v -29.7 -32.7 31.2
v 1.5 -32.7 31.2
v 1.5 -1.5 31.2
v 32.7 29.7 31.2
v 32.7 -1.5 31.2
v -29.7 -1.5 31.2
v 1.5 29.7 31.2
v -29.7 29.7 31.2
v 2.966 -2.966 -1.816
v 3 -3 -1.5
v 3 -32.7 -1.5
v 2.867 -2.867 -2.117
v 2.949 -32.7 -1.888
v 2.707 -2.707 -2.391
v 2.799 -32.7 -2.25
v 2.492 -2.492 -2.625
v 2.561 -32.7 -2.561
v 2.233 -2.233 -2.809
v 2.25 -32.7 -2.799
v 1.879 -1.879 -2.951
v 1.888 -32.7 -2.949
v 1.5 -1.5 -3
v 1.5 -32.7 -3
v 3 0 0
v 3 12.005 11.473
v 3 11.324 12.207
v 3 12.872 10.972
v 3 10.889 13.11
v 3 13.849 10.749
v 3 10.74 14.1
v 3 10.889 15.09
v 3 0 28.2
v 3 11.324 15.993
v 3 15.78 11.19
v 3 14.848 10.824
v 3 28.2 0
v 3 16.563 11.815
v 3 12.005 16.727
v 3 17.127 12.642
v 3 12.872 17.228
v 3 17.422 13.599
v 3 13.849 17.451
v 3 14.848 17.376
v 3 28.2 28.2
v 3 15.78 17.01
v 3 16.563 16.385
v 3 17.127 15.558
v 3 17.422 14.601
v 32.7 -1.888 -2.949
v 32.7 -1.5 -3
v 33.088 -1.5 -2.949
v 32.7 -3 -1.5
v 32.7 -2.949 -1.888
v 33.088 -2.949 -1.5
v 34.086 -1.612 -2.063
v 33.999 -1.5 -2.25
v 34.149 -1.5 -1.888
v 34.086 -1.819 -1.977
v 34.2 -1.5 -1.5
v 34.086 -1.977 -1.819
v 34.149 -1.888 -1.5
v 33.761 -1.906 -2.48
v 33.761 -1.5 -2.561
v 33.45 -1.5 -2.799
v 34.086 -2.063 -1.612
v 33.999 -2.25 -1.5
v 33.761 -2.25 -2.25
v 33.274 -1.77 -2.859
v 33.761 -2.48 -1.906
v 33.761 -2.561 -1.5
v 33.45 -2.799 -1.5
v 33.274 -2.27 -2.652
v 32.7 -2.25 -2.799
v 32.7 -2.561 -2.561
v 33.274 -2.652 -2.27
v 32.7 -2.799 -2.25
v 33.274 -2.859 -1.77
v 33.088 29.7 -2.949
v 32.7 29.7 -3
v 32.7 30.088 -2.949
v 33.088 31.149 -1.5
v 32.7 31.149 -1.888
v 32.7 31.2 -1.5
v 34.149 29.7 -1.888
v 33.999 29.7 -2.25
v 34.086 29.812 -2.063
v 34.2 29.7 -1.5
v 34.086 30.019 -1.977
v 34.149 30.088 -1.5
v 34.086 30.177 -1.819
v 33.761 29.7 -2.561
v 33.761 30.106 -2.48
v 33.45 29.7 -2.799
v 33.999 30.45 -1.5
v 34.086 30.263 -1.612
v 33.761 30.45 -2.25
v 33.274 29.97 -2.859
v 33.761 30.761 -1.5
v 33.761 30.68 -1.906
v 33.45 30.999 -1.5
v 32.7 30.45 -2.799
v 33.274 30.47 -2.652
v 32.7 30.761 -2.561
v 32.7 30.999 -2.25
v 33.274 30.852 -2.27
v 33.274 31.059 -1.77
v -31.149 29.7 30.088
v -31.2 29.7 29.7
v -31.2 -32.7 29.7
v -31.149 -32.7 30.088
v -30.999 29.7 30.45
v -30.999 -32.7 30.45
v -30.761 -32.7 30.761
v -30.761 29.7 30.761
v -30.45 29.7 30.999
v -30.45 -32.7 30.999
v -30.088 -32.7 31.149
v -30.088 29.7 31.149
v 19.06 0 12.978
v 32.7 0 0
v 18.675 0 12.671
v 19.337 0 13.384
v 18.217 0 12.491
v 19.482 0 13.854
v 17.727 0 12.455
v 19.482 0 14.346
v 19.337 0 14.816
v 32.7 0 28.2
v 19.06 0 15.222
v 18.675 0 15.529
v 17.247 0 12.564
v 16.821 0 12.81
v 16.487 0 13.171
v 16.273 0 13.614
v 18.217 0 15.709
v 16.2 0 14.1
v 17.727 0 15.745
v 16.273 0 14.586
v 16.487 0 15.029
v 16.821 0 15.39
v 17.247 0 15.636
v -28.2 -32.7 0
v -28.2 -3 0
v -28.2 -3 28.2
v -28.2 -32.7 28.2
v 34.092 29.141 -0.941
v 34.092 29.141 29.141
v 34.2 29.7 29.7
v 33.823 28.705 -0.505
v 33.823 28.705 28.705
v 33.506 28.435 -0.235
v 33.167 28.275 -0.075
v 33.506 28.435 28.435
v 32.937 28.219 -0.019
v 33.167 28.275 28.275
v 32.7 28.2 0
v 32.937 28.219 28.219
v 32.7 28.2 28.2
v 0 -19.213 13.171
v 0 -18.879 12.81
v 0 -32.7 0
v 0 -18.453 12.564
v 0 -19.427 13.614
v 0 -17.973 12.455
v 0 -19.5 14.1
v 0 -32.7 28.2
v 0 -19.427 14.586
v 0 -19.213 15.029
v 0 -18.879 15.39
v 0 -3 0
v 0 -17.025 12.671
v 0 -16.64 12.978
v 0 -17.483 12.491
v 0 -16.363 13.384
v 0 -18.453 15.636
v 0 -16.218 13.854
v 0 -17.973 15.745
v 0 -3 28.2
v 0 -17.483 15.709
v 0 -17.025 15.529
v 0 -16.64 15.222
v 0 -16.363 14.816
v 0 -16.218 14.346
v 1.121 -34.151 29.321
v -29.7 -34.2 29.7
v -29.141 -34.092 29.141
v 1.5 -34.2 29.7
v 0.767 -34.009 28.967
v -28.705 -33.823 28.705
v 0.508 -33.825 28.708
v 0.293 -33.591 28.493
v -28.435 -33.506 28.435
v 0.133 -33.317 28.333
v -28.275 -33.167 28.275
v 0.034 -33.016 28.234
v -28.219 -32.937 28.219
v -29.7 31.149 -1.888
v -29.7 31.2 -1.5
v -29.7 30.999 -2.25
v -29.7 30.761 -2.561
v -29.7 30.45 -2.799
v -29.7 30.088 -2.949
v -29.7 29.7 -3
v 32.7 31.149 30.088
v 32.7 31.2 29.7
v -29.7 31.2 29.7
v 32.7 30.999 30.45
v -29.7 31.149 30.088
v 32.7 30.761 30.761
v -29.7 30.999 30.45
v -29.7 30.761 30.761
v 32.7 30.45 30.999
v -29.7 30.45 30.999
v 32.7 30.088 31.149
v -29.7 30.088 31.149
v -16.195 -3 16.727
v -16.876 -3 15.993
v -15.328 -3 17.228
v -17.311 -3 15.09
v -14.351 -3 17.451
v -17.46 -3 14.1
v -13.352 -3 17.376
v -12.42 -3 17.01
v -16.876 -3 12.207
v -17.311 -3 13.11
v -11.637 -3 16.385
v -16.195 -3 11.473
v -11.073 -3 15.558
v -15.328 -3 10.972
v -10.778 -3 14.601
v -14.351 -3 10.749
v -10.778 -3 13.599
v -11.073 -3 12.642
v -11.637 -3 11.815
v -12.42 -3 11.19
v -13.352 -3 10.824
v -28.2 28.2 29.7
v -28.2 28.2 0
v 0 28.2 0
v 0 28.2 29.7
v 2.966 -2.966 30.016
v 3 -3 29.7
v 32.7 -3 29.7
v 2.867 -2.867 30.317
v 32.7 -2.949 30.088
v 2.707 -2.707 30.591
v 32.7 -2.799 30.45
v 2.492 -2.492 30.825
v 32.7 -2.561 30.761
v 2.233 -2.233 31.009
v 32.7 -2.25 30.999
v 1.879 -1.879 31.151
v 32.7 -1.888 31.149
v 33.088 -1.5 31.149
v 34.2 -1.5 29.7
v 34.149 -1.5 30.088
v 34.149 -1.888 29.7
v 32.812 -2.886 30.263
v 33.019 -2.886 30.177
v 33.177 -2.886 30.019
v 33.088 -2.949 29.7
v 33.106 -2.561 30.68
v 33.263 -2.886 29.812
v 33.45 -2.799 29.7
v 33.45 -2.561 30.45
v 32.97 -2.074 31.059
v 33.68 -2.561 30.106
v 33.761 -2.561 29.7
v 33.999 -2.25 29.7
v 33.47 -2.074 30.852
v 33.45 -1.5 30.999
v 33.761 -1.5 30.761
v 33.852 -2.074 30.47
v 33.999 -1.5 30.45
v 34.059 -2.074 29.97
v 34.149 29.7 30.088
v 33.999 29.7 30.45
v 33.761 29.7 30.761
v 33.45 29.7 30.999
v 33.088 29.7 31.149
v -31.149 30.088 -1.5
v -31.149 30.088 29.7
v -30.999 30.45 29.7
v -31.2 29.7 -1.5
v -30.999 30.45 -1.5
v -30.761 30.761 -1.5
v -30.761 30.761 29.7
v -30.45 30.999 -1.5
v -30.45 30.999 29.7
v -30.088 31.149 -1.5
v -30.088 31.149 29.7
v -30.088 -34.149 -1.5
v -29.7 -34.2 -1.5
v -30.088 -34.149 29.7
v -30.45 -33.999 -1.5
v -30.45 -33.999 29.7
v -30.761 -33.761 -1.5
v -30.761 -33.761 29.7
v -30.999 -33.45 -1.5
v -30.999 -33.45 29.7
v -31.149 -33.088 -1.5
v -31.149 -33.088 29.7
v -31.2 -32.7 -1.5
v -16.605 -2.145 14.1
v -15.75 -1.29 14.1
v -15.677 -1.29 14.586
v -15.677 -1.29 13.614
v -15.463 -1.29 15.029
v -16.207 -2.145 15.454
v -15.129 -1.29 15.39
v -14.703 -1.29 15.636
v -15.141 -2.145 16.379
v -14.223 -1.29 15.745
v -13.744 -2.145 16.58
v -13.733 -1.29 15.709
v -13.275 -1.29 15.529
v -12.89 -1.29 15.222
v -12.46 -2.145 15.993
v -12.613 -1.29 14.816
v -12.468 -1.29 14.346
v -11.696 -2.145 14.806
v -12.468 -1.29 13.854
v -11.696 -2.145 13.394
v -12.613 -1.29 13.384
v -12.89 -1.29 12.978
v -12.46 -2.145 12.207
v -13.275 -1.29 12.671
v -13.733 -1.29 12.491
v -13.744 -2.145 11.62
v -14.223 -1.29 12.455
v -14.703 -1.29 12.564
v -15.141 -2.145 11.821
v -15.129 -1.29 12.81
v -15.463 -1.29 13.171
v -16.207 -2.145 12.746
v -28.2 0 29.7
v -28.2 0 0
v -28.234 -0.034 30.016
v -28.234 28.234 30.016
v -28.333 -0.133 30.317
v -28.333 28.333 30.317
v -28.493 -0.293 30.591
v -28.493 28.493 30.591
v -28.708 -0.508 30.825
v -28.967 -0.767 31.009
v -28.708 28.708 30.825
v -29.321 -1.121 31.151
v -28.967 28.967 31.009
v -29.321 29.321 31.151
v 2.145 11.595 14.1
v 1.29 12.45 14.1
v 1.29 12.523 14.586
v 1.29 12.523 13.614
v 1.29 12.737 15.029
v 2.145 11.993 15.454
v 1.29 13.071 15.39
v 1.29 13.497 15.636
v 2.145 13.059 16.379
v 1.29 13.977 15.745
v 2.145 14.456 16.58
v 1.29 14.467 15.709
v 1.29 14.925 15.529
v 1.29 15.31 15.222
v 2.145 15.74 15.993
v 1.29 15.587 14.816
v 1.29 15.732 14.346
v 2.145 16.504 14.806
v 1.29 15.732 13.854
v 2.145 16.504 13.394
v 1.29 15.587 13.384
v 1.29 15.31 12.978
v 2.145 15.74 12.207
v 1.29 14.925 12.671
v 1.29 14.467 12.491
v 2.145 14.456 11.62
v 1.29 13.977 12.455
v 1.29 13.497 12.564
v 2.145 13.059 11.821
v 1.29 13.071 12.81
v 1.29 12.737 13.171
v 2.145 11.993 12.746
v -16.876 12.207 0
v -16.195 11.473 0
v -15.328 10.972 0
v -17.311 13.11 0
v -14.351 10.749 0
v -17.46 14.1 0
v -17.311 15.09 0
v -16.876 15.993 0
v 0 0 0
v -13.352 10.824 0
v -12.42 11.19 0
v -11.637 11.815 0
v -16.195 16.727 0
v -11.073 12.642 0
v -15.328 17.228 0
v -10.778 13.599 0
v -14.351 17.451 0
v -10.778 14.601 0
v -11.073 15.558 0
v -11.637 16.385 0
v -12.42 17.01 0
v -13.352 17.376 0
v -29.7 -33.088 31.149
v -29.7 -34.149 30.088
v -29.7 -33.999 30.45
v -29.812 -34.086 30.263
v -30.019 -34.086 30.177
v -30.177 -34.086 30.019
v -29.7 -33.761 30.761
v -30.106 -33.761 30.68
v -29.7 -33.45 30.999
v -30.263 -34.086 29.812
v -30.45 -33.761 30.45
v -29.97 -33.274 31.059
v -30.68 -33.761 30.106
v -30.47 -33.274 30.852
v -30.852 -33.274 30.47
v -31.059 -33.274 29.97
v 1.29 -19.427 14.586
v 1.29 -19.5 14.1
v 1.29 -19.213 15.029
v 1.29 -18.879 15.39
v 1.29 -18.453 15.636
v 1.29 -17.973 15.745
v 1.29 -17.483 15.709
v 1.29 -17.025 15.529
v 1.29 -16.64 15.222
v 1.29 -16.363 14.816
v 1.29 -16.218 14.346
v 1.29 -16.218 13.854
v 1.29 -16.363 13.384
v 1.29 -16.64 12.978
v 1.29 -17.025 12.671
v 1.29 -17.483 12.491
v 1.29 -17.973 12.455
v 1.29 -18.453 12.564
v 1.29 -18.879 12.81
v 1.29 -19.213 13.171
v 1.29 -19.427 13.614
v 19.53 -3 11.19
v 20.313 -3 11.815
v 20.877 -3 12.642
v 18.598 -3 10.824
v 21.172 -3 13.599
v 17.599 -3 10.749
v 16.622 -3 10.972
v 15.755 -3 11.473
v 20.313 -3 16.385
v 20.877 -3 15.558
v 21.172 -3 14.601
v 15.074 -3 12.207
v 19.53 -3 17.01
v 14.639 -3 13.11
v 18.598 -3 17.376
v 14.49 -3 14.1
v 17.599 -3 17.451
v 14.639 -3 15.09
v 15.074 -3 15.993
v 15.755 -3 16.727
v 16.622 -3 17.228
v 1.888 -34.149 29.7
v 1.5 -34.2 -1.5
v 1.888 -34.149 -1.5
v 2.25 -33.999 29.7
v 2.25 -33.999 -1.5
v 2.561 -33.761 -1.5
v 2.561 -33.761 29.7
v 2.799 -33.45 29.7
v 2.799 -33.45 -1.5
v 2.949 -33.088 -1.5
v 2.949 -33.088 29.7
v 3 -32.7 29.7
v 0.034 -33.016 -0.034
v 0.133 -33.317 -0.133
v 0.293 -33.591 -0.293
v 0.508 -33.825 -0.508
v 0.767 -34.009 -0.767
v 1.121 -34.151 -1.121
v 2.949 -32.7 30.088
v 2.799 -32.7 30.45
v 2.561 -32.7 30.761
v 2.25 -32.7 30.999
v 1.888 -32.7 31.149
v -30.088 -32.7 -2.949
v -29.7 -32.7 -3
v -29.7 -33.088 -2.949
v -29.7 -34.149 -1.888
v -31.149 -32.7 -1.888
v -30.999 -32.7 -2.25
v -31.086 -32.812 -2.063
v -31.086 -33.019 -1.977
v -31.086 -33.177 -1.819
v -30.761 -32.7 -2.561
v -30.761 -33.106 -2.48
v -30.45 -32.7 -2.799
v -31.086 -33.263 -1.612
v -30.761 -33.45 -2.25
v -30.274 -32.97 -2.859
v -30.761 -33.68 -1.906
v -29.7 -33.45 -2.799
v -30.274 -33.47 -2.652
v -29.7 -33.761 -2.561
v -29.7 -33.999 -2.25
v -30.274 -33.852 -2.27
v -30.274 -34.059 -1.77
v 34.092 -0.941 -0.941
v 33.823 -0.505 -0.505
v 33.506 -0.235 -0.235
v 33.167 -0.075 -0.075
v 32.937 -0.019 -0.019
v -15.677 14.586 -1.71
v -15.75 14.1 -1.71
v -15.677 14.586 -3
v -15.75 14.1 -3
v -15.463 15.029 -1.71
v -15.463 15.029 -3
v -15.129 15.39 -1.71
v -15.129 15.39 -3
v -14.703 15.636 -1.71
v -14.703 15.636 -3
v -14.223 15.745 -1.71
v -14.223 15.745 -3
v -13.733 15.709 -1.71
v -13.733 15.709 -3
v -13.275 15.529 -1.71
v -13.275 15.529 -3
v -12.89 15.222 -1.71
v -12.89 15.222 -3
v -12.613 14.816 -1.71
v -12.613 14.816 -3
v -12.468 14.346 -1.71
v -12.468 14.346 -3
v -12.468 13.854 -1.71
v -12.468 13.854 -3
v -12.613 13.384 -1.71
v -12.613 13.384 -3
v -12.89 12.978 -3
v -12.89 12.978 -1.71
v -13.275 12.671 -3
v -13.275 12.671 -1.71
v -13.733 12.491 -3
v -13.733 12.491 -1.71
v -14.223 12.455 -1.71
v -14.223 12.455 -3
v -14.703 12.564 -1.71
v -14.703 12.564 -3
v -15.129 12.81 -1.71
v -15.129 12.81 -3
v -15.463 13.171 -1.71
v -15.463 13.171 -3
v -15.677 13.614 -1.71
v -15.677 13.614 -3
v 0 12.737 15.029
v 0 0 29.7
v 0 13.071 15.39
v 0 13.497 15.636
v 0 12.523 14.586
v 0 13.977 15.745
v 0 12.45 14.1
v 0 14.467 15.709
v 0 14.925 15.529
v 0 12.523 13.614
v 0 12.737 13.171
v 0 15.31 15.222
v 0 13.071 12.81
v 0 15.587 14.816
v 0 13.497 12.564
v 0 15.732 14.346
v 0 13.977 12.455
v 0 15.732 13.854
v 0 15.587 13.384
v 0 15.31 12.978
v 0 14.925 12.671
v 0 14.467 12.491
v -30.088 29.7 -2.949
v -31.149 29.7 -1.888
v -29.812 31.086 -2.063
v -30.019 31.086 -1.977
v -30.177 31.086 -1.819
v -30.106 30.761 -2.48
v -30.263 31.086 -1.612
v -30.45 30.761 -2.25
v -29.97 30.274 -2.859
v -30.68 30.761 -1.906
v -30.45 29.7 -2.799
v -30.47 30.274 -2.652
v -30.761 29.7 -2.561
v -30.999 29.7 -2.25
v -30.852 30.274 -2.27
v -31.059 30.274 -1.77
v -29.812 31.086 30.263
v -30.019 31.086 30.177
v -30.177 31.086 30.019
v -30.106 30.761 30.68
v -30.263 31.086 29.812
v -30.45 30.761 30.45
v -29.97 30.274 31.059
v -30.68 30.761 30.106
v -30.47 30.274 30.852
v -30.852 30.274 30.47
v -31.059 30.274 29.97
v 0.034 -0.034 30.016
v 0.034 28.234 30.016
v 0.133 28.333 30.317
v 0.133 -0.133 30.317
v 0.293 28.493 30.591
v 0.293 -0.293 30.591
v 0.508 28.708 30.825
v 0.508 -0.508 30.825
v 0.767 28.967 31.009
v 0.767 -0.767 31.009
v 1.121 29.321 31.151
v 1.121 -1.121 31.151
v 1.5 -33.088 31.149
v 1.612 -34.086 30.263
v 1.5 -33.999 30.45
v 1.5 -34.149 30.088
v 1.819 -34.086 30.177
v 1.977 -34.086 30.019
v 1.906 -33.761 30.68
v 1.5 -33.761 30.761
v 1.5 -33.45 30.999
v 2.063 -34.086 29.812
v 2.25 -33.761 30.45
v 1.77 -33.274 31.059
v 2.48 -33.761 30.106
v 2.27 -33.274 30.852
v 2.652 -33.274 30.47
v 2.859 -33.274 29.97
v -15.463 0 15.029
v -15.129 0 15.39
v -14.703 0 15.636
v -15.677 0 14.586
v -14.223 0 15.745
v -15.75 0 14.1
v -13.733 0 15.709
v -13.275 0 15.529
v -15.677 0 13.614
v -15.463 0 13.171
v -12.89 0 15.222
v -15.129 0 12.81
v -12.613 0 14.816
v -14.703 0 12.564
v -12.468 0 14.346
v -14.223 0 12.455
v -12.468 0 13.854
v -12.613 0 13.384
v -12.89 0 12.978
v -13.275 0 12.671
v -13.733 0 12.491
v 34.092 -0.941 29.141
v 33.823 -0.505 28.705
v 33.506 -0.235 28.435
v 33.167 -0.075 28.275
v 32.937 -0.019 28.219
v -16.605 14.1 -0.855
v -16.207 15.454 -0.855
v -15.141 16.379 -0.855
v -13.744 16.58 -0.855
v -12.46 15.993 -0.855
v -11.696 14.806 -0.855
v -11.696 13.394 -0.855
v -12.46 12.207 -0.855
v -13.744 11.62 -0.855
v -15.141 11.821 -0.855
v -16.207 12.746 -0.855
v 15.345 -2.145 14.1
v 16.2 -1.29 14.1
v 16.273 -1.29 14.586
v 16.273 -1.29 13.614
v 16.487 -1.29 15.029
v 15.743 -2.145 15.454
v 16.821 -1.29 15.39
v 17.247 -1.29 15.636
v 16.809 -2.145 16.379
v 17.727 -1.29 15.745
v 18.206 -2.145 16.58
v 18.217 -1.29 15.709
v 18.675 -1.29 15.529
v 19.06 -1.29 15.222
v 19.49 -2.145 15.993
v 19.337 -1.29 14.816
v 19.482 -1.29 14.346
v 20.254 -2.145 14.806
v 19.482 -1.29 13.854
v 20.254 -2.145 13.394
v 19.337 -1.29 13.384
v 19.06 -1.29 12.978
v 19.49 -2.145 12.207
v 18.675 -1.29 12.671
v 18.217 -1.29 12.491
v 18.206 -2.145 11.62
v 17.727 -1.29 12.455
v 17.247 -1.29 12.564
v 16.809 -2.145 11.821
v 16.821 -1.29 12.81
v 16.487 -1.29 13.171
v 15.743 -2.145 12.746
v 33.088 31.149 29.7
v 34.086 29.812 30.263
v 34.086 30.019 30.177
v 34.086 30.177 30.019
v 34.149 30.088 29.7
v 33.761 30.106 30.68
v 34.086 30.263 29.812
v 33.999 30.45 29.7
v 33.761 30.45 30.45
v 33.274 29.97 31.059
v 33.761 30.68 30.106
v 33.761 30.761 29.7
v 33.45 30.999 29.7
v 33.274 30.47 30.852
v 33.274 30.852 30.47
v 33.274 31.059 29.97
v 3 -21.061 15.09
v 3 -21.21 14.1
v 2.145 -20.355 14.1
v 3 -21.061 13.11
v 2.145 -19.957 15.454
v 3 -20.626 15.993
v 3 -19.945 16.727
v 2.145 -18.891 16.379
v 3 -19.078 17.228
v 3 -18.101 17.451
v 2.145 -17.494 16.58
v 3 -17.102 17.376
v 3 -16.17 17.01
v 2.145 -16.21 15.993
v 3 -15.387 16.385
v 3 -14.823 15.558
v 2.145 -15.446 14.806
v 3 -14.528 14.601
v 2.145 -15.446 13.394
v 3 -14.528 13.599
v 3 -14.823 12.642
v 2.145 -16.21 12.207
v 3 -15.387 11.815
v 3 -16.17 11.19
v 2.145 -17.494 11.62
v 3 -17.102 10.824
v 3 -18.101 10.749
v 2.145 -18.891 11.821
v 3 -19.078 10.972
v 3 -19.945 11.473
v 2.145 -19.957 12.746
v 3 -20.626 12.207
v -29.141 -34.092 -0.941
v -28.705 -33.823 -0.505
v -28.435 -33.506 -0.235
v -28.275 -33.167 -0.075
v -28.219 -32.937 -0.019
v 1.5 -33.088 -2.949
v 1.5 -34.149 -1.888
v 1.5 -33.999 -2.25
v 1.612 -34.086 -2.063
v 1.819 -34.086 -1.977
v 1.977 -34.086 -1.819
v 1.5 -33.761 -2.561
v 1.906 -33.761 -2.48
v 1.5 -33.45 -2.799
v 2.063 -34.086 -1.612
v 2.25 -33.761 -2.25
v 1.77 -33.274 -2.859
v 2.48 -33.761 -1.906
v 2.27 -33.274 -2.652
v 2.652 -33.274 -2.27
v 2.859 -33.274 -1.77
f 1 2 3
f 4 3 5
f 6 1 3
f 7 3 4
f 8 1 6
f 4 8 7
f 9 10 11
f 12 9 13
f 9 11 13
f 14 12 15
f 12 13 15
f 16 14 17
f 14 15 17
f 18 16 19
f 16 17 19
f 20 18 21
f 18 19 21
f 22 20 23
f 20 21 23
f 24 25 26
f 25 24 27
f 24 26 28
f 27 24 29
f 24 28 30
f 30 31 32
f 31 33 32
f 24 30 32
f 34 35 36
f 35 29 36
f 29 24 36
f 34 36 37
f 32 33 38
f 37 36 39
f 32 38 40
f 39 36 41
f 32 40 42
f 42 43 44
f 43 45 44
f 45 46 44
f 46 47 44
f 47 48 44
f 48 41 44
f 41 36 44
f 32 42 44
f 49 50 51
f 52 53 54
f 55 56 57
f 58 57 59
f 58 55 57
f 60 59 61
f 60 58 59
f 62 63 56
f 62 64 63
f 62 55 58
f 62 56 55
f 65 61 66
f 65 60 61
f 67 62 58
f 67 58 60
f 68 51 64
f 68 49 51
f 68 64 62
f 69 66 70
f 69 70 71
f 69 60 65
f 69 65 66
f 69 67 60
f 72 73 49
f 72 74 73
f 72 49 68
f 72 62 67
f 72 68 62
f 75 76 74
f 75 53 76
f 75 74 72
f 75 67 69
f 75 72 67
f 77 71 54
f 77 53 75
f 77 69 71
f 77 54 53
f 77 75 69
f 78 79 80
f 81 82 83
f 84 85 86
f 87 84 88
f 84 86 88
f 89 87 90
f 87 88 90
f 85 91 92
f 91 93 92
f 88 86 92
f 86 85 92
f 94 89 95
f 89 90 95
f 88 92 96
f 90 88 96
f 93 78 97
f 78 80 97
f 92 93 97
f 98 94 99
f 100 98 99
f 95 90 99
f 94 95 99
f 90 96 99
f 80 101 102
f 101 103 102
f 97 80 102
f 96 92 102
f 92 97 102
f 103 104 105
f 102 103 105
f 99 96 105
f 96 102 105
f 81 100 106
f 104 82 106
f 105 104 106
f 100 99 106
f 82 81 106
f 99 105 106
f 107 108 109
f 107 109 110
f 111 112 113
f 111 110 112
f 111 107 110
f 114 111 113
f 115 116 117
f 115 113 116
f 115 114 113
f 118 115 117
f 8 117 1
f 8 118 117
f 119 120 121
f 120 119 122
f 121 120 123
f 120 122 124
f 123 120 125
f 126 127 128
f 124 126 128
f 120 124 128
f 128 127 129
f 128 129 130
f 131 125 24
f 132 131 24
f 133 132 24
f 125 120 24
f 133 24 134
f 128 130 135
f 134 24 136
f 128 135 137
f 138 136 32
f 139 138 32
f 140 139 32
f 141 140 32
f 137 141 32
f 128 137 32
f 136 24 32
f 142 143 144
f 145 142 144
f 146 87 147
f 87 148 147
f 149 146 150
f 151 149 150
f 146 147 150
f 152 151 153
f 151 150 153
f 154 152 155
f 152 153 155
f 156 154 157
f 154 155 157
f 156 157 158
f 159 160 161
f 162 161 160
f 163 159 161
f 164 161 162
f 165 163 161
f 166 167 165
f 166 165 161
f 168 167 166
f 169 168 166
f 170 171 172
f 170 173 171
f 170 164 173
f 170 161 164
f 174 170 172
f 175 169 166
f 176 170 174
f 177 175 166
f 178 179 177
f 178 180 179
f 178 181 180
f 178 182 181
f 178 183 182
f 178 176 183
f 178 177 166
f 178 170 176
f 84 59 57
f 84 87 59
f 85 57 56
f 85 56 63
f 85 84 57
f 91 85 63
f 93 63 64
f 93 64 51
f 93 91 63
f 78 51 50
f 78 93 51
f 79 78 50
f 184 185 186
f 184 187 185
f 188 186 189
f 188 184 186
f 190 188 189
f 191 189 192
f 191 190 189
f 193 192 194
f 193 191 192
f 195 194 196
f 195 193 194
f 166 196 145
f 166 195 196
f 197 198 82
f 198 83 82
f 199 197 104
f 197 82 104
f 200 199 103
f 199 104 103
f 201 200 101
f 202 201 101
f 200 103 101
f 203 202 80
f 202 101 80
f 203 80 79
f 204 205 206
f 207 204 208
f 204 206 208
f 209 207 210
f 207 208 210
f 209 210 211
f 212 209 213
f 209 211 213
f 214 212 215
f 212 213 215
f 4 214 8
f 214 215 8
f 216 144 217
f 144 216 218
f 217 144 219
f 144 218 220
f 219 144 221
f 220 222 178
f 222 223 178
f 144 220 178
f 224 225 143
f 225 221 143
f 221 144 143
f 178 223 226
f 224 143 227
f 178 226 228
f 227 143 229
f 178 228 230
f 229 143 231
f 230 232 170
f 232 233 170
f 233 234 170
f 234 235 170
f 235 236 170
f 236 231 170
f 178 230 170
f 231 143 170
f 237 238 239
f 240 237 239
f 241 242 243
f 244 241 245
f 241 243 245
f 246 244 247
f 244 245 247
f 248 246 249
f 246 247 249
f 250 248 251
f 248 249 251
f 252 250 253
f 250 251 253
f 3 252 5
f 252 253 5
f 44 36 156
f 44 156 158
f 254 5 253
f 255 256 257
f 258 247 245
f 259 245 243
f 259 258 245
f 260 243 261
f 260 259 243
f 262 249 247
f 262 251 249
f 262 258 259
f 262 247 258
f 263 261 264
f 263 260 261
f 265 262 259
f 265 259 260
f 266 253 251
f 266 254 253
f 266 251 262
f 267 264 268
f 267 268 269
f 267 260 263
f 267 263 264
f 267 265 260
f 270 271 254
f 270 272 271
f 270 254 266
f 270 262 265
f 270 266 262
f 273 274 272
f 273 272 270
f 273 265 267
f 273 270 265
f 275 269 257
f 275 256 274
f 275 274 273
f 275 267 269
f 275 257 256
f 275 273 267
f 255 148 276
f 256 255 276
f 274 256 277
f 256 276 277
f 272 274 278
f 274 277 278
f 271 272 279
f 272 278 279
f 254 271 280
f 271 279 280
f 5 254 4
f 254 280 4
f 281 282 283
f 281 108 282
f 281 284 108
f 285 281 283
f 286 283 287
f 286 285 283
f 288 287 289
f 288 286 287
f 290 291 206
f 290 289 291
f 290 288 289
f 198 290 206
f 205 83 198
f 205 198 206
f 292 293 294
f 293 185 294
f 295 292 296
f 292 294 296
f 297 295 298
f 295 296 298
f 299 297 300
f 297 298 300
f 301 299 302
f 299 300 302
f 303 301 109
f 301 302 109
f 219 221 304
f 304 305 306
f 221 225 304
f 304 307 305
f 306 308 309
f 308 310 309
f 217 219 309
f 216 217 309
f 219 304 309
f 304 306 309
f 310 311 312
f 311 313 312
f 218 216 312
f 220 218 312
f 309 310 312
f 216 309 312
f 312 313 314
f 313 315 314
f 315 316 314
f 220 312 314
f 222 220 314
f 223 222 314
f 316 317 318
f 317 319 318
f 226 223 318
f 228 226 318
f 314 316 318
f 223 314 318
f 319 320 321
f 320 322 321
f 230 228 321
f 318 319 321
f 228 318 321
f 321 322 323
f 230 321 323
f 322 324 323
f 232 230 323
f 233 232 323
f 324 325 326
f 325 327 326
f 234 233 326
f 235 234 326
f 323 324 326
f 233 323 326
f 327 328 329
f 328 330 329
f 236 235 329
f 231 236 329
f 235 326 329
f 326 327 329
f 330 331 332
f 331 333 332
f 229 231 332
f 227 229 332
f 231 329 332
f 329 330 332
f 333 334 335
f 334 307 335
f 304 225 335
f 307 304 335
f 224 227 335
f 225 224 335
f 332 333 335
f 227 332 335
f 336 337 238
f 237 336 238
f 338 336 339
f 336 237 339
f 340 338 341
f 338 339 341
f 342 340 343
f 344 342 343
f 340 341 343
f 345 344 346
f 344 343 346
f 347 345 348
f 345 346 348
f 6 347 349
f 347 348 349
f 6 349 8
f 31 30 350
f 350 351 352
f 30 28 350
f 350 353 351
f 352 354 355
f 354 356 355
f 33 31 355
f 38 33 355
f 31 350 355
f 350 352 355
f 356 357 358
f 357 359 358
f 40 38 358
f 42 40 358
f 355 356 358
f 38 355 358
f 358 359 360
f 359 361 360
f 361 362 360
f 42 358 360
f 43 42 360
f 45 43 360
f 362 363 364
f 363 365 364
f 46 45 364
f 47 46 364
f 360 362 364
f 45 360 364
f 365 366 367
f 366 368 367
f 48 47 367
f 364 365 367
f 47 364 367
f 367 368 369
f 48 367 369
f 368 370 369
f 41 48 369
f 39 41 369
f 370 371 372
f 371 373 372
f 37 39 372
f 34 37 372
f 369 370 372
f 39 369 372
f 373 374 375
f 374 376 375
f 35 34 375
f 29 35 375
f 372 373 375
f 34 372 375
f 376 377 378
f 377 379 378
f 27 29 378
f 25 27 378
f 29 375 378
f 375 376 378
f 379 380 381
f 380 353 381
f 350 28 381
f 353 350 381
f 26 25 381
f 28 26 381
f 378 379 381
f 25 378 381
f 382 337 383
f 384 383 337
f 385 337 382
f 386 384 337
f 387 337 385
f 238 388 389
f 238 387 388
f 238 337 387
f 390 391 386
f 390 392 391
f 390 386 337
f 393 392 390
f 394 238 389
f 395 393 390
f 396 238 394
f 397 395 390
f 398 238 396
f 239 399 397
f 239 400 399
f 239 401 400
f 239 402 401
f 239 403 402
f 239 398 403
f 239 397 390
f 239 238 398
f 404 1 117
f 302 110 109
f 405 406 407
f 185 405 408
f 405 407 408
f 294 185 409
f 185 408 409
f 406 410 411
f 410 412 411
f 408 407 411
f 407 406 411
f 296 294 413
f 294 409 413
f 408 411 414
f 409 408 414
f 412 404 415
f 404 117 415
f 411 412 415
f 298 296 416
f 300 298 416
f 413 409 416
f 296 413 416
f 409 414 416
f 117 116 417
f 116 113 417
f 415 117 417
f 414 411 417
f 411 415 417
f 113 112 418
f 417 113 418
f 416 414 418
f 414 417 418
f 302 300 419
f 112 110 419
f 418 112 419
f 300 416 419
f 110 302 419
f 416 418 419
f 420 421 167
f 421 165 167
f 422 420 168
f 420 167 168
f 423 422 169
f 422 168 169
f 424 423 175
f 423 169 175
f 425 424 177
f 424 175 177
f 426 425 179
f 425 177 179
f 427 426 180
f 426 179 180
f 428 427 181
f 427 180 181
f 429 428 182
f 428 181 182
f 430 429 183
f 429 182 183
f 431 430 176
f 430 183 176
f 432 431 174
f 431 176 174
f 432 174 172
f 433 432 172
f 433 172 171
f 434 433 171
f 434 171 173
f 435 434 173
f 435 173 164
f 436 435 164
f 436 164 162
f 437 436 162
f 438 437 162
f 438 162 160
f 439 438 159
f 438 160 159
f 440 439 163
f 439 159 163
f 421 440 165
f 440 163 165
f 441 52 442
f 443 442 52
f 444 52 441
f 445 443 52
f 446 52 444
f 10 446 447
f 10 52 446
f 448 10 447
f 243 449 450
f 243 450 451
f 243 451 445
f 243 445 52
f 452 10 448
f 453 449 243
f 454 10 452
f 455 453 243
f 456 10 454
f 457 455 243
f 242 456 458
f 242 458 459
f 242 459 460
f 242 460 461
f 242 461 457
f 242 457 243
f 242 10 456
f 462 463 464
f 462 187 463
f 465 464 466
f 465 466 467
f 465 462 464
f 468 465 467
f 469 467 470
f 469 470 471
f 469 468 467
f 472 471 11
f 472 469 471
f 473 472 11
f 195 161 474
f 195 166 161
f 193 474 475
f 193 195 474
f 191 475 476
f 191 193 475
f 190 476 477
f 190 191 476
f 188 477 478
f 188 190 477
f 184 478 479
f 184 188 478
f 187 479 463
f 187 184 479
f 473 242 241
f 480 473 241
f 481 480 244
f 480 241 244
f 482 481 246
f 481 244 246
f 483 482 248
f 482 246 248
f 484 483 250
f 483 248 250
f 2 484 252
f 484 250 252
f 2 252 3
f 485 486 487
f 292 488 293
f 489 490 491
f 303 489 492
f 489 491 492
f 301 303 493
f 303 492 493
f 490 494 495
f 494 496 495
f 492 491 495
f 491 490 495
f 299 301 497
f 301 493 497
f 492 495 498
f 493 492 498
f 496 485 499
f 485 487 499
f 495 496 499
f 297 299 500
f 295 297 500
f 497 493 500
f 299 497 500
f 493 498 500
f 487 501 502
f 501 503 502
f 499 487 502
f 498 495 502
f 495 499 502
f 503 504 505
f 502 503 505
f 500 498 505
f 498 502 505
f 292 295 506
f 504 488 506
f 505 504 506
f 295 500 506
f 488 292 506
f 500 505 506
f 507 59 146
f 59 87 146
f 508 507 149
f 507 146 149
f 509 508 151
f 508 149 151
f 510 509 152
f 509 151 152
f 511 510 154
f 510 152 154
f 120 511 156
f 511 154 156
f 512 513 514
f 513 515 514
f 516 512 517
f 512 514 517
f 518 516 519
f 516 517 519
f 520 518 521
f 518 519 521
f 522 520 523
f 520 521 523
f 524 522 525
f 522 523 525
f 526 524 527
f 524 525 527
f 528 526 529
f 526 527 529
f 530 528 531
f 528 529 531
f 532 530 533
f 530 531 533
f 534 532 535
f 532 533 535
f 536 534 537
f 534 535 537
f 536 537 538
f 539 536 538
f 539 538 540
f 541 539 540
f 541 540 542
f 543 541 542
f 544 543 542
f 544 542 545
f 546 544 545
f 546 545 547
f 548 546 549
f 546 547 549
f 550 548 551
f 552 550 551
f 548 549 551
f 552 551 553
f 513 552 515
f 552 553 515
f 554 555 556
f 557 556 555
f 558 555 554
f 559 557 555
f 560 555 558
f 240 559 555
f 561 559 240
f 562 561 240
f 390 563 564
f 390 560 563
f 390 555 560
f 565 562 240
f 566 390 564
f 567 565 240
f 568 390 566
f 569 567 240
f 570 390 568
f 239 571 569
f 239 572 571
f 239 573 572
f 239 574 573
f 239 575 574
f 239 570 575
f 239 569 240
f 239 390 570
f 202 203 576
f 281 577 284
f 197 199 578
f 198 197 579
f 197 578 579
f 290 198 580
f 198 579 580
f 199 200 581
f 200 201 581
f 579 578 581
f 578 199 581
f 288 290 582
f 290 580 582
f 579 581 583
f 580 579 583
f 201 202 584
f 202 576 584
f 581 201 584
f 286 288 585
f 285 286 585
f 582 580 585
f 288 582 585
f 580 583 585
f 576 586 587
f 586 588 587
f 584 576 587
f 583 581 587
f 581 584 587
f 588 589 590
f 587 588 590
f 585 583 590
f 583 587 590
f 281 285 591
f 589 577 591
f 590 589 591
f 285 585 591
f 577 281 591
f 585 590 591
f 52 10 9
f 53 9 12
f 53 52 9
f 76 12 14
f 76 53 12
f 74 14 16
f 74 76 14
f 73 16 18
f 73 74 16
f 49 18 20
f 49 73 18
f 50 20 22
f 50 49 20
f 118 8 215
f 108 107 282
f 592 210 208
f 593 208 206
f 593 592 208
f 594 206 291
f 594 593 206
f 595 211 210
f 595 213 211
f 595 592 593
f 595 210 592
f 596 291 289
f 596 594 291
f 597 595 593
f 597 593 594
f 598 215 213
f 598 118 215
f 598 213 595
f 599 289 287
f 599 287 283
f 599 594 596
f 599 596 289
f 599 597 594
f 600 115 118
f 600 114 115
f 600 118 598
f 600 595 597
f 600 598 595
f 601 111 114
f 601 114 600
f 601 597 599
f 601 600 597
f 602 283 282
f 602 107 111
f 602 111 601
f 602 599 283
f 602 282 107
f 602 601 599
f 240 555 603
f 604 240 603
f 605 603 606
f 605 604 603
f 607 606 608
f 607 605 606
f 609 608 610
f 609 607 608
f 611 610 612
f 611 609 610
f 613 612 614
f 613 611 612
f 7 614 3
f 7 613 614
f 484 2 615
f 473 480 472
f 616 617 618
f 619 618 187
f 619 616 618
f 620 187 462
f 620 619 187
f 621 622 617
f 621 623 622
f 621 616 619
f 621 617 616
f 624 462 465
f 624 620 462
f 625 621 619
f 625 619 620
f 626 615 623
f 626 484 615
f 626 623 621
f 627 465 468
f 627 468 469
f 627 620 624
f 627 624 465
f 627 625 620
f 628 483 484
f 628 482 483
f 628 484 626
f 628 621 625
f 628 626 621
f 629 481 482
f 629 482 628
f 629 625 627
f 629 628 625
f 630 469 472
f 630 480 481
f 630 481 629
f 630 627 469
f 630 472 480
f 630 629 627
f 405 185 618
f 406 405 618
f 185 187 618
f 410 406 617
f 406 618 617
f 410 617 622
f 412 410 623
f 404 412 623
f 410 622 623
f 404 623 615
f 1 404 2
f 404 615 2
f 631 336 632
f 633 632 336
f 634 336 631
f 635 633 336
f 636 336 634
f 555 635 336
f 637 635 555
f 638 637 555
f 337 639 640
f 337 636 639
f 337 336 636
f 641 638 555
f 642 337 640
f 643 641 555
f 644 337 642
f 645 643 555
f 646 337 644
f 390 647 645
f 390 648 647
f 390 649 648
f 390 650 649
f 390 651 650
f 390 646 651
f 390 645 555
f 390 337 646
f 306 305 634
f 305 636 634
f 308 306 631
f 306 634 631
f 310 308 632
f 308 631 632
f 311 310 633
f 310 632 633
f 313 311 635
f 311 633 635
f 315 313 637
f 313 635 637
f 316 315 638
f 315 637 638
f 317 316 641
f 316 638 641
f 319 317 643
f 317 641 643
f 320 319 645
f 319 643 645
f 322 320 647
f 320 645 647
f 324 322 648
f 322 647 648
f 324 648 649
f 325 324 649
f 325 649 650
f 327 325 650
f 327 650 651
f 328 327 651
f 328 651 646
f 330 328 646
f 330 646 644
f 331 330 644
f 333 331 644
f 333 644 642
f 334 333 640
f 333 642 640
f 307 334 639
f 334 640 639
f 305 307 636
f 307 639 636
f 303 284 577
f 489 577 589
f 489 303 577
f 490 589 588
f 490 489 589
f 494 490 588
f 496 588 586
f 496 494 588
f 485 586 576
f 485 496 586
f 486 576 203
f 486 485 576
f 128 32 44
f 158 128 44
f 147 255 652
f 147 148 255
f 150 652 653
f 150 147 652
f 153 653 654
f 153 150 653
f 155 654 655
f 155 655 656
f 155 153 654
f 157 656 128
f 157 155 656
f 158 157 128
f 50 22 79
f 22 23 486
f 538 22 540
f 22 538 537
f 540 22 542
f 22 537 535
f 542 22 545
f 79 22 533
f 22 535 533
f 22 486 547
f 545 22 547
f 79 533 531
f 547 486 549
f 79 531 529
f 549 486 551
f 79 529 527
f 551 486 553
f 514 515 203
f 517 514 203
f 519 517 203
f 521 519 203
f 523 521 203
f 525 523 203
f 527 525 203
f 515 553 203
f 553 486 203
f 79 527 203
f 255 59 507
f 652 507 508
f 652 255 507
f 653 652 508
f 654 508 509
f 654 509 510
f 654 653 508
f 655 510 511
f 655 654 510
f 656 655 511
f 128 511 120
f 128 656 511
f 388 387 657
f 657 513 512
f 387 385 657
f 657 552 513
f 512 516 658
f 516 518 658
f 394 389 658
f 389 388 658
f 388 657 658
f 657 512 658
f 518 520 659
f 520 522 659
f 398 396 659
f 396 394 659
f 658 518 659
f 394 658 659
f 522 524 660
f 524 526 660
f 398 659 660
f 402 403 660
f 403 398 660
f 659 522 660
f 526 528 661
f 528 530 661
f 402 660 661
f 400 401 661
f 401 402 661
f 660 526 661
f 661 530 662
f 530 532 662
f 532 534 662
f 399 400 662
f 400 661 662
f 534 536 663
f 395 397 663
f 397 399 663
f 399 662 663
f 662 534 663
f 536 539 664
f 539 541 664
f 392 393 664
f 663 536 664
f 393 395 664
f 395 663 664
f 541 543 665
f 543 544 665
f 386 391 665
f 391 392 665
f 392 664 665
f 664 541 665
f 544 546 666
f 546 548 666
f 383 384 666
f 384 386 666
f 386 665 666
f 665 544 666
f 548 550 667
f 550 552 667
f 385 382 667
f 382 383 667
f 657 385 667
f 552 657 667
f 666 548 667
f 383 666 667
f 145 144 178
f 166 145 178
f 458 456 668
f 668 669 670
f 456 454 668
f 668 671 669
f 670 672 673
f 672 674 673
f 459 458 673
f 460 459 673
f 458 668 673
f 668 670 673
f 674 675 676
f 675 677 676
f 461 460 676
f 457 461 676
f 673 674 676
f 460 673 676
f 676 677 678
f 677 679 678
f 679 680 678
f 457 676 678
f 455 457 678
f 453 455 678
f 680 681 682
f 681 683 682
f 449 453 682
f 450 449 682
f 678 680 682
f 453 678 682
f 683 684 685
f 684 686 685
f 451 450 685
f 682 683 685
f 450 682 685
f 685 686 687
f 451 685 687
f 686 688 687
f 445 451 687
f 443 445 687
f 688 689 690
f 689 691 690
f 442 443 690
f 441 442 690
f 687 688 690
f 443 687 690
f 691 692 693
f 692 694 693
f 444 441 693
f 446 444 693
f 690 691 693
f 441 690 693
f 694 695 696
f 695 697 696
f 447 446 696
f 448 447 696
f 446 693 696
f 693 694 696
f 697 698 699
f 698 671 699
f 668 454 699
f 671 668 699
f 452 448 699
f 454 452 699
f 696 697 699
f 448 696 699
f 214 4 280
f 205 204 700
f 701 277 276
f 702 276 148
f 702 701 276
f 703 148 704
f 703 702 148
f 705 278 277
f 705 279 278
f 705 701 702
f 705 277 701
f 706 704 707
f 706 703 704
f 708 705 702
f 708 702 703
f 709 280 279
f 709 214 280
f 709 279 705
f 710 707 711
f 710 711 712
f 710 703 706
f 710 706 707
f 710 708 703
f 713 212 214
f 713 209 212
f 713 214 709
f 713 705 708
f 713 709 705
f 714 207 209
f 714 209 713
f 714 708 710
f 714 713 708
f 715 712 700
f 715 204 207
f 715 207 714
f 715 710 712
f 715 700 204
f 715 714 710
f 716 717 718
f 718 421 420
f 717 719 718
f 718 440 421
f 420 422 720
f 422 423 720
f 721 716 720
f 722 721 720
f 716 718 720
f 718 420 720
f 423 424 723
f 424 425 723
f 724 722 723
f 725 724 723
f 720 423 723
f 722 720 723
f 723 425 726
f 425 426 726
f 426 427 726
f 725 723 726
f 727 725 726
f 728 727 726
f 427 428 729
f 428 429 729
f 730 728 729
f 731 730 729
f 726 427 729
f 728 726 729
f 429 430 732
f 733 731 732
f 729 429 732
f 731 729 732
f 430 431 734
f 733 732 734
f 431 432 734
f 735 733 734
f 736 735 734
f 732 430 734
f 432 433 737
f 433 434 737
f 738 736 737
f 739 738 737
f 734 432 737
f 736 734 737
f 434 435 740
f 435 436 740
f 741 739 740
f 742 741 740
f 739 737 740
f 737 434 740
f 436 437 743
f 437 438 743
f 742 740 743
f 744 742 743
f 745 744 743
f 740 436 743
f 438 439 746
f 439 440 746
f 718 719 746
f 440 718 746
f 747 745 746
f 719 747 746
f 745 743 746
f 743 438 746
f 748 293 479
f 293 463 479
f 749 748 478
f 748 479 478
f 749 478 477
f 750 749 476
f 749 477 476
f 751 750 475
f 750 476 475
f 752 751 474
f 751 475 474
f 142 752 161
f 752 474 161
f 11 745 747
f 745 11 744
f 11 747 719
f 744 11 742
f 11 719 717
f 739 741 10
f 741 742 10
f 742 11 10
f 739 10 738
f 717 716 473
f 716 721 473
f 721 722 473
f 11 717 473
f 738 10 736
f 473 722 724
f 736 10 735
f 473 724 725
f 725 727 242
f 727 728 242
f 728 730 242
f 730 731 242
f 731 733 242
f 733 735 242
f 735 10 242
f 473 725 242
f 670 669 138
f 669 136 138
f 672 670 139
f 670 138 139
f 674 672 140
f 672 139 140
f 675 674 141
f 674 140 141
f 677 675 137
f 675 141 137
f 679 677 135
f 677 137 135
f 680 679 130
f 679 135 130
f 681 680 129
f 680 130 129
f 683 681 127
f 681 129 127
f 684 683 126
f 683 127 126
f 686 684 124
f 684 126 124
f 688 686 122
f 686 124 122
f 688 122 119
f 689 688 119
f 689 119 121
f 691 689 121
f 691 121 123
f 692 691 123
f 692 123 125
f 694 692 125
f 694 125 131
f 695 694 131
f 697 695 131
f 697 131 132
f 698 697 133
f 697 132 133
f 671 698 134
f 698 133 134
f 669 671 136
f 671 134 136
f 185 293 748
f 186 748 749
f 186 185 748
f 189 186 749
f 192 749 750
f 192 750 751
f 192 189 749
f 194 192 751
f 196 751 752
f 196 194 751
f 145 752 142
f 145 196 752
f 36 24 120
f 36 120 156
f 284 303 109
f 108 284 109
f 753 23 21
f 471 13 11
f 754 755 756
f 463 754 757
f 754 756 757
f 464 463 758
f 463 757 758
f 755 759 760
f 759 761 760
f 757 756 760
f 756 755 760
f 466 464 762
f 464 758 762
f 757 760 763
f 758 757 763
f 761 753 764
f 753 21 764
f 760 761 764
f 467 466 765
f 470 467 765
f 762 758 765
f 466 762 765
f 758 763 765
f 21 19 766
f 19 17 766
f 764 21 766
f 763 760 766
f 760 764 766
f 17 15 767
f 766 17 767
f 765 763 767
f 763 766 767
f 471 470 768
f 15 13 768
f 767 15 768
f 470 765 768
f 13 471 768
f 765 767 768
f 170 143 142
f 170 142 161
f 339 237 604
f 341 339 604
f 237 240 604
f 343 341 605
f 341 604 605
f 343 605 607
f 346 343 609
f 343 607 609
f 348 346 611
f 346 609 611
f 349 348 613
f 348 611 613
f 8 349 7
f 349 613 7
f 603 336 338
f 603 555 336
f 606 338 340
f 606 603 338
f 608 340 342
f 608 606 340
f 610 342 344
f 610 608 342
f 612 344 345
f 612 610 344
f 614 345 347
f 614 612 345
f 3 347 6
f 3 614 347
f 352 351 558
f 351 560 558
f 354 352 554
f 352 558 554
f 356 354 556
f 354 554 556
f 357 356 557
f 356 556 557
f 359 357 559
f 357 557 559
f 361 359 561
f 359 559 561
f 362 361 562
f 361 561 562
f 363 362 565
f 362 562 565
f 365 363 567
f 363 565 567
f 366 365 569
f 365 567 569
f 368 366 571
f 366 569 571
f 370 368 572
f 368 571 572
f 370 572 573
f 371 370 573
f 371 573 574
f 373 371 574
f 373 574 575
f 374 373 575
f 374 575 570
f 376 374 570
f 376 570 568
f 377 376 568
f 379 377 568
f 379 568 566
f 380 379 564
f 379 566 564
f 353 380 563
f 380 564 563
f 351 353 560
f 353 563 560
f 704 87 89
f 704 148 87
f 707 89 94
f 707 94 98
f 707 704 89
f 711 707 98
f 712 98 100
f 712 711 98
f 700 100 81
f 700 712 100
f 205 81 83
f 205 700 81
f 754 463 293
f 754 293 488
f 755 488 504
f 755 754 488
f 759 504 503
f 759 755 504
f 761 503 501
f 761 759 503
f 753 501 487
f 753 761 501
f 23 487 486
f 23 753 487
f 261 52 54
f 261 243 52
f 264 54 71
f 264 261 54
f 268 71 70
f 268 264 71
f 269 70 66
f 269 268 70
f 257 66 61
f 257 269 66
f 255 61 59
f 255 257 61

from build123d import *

# Parameters (mm, degrees)
F0_W                  = 34.2
F0_H                  = 34.2
F0_W_2                = 28.2
F0_H_2                = 28.2
F1_DEPTH              = 3
F2_DEPTH              = 31.2
F3_W                  = 34.2
F3_H                  = 34.2
F3_W_2                = 28.2
F3_H_2                = 28.2
F4_DEPTH              = 31.2
F5_W                  = 34.2
F5_H                  = 34.2
F5_W_2                = 28.2
F5_H_2                = 28.2
F6_DEPTH              = 31.2
F7_D                  = 3.3
F7_DEPTH              = 13.5
F7_CSINK_D            = 6.72
F7_CSINK_ANGLE        = 90
F7_TIP                = 0.9914200214
F7_ON_F5_D            = 3.3
F7_ON_F5_DEPTH        = 13.5
F7_ON_F5_CSINK_D      = 6.72
F7_ON_F5_CSINK_ANGLE  = 90
F7_ON_F5_TIP          = 0.9914200214
F7_ON_F3_D            = 3.3
F7_ON_F3_DEPTH        = 13.5
F7_ON_F3_CSINK_D      = 6.72
F7_ON_F3_CSINK_ANGLE  = 90
F7_ON_F3_TIP          = 0.9914200214
F8_R                  = 1.49999
F11_D                 = 3.3
F11_DEPTH             = 13.5
F11_CSINK_D           = 6.72
F11_CSINK_ANGLE       = 90
F11_TIP               = 0.9914200214
F11_ON_F9_D           = 3.3
F11_ON_F9_DEPTH       = 13.5
F11_ON_F9_CSINK_D     = 6.72
F11_ON_F9_CSINK_ANGLE = 90
F11_ON_F9_TIP         = 0.9914200214


# Not quite as in the source:
# - a fillet or chamfer is up to 0.001 mm smaller than in the source, because OpenCascade refuses the exact size


with BuildPart() as f1:
    # F0 (on Top) → F1 (new body)
    with BuildSketch(Plane.XY):
        with Locations((-14.1, 14.1)):
            Rectangle(F0_W, F0_H)
        with Locations((-14.1, 14.1)):
            Rectangle(F0_W_2, F0_H_2, mode=Mode.SUBTRACT)
        with Locations((-14.1, 14.1)):
            Rectangle(F0_W_2, F0_H_2)
    extrude(amount=-F1_DEPTH)

    # F0 (on Top) → F2 (join)
    with BuildSketch(Plane.XY):
        with Locations((-14.1, 14.1)):
            Rectangle(F0_W, F0_H)
        with Locations((-14.1, 14.1)):
            Rectangle(F0_W_2, F0_H_2, mode=Mode.SUBTRACT)
    extrude(amount=F2_DEPTH)

    # F3 (on face) → F4 (join)
    with BuildSketch(Plane.XZ.offset(3)):
        with Locations((-14.1, 14.1)):
            Rectangle(F3_W, F3_H)
        with Locations((-14.1, 14.1)):
            Rectangle(F3_W_2, F3_H_2, mode=Mode.SUBTRACT)
    extrude(amount=F4_DEPTH)

    # F5 (on face) → F6 (join)
    with BuildSketch(Plane.YZ.offset(3)):
        with Locations((14.1, 14.1)):
            Rectangle(F5_W, F5_H)
        with Locations((14.1, 14.1)):
            Rectangle(F5_W_2, F5_H_2, mode=Mode.SUBTRACT)
    extrude(amount=F6_DEPTH)

    # F7
    with Locations(Plane.XY):
        with Locations((-14.1, 14.1)):
            CounterSinkHole(F7_D / 2, F7_CSINK_D / 2, depth=F7_DEPTH, counter_sink_angle=F7_CSINK_ANGLE)
            with Locations((0, 0, -(F7_DEPTH + F7_TIP / 2))):  # 118° drill point
                Cone(0, F7_D / 2, F7_TIP, mode=Mode.SUBTRACT)

    # F7 on F5
    with Locations(Plane.YZ.offset(3)):
        with Locations((14.1, 14.1)):
            CounterSinkHole(F7_ON_F5_D / 2, F7_ON_F5_CSINK_D / 2, depth=F7_ON_F5_DEPTH, counter_sink_angle=F7_ON_F5_CSINK_ANGLE)
            with Locations((0, 0, -(F7_ON_F5_DEPTH + F7_ON_F5_TIP / 2))):  # 118° drill point
                Cone(0, F7_ON_F5_D / 2, F7_ON_F5_TIP, mode=Mode.SUBTRACT)

    # F7 on F3
    with Locations(Plane.XZ.offset(3)):
        with Locations((-14.1, 14.1)):
            CounterSinkHole(F7_ON_F3_D / 2, F7_ON_F3_CSINK_D / 2, depth=F7_ON_F3_DEPTH, counter_sink_angle=F7_ON_F3_CSINK_ANGLE)
            with Locations((0, 0, -(F7_ON_F3_DEPTH + F7_ON_F3_TIP / 2))):  # 118° drill point
                Cone(0, F7_ON_F3_D / 2, F7_ON_F3_TIP, mode=Mode.SUBTRACT)

    # F8 (radius 1.5 in the source; OpenCascade refuses exactly that, so slightly less here)
    f8_edges = [f1.edges().sort_by_distance(p)[0] for p in [
        (-31.2, -1.5, 31.2),
        (1.5, 31.2, 31.2),
        (34.2, 14.1, 31.2),
        (18.6, -3, 31.2),
        (3, -18.6, 31.2),
        (-14.1, -34.2, 31.2),
        (-14.1, 0, 31.2),
        (0, 14.1, 31.2),
        (-28.2, 14.1, 31.2),
        (-14.1, 28.2, 31.2),
        (18.6, -3, -3),
        (3, -18.6, -3),
        (-14.1, -34.2, -3),
        (-31.2, -1.5, -3),
        (1.5, 31.2, -3),
        (34.2, 14.1, -3),
        (3, -34.2, 14.1),
        (0, -34.2, 14.1),
        (-28.2, -34.2, 14.1),
        (-31.2, -34.2, 14.1),
        (-14.1, -34.2, 28.2),
        (-14.1, -34.2, 0),
        (-31.2, 31.2, 14.1),
        (34.2, 31.2, 14.1),
        (34.2, 28.2, 14.1),
        (34.2, 0, 14.1),
        (34.2, -3, 14.1),
        (34.2, 14.1, 0),
        (34.2, 14.1, 28.2),
    ]]
    fillet(f8_edges, radius=F8_R)

    # F11
    with Locations(Plane.XZ.offset(3)):
        with Locations((17.85, 14.1)):
            CounterSinkHole(F11_D / 2, F11_CSINK_D / 2, depth=F11_DEPTH, counter_sink_angle=F11_CSINK_ANGLE)
            with Locations((0, 0, -(F11_DEPTH + F11_TIP / 2))):  # 118° drill point
                Cone(0, F11_D / 2, F11_TIP, mode=Mode.SUBTRACT)

    # F11 on F9
    with Locations(Plane.YZ.offset(3)):
        with Locations((-17.85, 14.1)):
            CounterSinkHole(F11_ON_F9_D / 2, F11_ON_F9_CSINK_D / 2, depth=F11_ON_F9_DEPTH, counter_sink_angle=F11_ON_F9_CSINK_ANGLE)
            with Locations((0, 0, -(F11_ON_F9_DEPTH + F11_ON_F9_TIP / 2))):  # 118° drill point
                Cone(0, F11_ON_F9_D / 2, F11_ON_F9_TIP, mode=Mode.SUBTRACT)


solid = f1.part
